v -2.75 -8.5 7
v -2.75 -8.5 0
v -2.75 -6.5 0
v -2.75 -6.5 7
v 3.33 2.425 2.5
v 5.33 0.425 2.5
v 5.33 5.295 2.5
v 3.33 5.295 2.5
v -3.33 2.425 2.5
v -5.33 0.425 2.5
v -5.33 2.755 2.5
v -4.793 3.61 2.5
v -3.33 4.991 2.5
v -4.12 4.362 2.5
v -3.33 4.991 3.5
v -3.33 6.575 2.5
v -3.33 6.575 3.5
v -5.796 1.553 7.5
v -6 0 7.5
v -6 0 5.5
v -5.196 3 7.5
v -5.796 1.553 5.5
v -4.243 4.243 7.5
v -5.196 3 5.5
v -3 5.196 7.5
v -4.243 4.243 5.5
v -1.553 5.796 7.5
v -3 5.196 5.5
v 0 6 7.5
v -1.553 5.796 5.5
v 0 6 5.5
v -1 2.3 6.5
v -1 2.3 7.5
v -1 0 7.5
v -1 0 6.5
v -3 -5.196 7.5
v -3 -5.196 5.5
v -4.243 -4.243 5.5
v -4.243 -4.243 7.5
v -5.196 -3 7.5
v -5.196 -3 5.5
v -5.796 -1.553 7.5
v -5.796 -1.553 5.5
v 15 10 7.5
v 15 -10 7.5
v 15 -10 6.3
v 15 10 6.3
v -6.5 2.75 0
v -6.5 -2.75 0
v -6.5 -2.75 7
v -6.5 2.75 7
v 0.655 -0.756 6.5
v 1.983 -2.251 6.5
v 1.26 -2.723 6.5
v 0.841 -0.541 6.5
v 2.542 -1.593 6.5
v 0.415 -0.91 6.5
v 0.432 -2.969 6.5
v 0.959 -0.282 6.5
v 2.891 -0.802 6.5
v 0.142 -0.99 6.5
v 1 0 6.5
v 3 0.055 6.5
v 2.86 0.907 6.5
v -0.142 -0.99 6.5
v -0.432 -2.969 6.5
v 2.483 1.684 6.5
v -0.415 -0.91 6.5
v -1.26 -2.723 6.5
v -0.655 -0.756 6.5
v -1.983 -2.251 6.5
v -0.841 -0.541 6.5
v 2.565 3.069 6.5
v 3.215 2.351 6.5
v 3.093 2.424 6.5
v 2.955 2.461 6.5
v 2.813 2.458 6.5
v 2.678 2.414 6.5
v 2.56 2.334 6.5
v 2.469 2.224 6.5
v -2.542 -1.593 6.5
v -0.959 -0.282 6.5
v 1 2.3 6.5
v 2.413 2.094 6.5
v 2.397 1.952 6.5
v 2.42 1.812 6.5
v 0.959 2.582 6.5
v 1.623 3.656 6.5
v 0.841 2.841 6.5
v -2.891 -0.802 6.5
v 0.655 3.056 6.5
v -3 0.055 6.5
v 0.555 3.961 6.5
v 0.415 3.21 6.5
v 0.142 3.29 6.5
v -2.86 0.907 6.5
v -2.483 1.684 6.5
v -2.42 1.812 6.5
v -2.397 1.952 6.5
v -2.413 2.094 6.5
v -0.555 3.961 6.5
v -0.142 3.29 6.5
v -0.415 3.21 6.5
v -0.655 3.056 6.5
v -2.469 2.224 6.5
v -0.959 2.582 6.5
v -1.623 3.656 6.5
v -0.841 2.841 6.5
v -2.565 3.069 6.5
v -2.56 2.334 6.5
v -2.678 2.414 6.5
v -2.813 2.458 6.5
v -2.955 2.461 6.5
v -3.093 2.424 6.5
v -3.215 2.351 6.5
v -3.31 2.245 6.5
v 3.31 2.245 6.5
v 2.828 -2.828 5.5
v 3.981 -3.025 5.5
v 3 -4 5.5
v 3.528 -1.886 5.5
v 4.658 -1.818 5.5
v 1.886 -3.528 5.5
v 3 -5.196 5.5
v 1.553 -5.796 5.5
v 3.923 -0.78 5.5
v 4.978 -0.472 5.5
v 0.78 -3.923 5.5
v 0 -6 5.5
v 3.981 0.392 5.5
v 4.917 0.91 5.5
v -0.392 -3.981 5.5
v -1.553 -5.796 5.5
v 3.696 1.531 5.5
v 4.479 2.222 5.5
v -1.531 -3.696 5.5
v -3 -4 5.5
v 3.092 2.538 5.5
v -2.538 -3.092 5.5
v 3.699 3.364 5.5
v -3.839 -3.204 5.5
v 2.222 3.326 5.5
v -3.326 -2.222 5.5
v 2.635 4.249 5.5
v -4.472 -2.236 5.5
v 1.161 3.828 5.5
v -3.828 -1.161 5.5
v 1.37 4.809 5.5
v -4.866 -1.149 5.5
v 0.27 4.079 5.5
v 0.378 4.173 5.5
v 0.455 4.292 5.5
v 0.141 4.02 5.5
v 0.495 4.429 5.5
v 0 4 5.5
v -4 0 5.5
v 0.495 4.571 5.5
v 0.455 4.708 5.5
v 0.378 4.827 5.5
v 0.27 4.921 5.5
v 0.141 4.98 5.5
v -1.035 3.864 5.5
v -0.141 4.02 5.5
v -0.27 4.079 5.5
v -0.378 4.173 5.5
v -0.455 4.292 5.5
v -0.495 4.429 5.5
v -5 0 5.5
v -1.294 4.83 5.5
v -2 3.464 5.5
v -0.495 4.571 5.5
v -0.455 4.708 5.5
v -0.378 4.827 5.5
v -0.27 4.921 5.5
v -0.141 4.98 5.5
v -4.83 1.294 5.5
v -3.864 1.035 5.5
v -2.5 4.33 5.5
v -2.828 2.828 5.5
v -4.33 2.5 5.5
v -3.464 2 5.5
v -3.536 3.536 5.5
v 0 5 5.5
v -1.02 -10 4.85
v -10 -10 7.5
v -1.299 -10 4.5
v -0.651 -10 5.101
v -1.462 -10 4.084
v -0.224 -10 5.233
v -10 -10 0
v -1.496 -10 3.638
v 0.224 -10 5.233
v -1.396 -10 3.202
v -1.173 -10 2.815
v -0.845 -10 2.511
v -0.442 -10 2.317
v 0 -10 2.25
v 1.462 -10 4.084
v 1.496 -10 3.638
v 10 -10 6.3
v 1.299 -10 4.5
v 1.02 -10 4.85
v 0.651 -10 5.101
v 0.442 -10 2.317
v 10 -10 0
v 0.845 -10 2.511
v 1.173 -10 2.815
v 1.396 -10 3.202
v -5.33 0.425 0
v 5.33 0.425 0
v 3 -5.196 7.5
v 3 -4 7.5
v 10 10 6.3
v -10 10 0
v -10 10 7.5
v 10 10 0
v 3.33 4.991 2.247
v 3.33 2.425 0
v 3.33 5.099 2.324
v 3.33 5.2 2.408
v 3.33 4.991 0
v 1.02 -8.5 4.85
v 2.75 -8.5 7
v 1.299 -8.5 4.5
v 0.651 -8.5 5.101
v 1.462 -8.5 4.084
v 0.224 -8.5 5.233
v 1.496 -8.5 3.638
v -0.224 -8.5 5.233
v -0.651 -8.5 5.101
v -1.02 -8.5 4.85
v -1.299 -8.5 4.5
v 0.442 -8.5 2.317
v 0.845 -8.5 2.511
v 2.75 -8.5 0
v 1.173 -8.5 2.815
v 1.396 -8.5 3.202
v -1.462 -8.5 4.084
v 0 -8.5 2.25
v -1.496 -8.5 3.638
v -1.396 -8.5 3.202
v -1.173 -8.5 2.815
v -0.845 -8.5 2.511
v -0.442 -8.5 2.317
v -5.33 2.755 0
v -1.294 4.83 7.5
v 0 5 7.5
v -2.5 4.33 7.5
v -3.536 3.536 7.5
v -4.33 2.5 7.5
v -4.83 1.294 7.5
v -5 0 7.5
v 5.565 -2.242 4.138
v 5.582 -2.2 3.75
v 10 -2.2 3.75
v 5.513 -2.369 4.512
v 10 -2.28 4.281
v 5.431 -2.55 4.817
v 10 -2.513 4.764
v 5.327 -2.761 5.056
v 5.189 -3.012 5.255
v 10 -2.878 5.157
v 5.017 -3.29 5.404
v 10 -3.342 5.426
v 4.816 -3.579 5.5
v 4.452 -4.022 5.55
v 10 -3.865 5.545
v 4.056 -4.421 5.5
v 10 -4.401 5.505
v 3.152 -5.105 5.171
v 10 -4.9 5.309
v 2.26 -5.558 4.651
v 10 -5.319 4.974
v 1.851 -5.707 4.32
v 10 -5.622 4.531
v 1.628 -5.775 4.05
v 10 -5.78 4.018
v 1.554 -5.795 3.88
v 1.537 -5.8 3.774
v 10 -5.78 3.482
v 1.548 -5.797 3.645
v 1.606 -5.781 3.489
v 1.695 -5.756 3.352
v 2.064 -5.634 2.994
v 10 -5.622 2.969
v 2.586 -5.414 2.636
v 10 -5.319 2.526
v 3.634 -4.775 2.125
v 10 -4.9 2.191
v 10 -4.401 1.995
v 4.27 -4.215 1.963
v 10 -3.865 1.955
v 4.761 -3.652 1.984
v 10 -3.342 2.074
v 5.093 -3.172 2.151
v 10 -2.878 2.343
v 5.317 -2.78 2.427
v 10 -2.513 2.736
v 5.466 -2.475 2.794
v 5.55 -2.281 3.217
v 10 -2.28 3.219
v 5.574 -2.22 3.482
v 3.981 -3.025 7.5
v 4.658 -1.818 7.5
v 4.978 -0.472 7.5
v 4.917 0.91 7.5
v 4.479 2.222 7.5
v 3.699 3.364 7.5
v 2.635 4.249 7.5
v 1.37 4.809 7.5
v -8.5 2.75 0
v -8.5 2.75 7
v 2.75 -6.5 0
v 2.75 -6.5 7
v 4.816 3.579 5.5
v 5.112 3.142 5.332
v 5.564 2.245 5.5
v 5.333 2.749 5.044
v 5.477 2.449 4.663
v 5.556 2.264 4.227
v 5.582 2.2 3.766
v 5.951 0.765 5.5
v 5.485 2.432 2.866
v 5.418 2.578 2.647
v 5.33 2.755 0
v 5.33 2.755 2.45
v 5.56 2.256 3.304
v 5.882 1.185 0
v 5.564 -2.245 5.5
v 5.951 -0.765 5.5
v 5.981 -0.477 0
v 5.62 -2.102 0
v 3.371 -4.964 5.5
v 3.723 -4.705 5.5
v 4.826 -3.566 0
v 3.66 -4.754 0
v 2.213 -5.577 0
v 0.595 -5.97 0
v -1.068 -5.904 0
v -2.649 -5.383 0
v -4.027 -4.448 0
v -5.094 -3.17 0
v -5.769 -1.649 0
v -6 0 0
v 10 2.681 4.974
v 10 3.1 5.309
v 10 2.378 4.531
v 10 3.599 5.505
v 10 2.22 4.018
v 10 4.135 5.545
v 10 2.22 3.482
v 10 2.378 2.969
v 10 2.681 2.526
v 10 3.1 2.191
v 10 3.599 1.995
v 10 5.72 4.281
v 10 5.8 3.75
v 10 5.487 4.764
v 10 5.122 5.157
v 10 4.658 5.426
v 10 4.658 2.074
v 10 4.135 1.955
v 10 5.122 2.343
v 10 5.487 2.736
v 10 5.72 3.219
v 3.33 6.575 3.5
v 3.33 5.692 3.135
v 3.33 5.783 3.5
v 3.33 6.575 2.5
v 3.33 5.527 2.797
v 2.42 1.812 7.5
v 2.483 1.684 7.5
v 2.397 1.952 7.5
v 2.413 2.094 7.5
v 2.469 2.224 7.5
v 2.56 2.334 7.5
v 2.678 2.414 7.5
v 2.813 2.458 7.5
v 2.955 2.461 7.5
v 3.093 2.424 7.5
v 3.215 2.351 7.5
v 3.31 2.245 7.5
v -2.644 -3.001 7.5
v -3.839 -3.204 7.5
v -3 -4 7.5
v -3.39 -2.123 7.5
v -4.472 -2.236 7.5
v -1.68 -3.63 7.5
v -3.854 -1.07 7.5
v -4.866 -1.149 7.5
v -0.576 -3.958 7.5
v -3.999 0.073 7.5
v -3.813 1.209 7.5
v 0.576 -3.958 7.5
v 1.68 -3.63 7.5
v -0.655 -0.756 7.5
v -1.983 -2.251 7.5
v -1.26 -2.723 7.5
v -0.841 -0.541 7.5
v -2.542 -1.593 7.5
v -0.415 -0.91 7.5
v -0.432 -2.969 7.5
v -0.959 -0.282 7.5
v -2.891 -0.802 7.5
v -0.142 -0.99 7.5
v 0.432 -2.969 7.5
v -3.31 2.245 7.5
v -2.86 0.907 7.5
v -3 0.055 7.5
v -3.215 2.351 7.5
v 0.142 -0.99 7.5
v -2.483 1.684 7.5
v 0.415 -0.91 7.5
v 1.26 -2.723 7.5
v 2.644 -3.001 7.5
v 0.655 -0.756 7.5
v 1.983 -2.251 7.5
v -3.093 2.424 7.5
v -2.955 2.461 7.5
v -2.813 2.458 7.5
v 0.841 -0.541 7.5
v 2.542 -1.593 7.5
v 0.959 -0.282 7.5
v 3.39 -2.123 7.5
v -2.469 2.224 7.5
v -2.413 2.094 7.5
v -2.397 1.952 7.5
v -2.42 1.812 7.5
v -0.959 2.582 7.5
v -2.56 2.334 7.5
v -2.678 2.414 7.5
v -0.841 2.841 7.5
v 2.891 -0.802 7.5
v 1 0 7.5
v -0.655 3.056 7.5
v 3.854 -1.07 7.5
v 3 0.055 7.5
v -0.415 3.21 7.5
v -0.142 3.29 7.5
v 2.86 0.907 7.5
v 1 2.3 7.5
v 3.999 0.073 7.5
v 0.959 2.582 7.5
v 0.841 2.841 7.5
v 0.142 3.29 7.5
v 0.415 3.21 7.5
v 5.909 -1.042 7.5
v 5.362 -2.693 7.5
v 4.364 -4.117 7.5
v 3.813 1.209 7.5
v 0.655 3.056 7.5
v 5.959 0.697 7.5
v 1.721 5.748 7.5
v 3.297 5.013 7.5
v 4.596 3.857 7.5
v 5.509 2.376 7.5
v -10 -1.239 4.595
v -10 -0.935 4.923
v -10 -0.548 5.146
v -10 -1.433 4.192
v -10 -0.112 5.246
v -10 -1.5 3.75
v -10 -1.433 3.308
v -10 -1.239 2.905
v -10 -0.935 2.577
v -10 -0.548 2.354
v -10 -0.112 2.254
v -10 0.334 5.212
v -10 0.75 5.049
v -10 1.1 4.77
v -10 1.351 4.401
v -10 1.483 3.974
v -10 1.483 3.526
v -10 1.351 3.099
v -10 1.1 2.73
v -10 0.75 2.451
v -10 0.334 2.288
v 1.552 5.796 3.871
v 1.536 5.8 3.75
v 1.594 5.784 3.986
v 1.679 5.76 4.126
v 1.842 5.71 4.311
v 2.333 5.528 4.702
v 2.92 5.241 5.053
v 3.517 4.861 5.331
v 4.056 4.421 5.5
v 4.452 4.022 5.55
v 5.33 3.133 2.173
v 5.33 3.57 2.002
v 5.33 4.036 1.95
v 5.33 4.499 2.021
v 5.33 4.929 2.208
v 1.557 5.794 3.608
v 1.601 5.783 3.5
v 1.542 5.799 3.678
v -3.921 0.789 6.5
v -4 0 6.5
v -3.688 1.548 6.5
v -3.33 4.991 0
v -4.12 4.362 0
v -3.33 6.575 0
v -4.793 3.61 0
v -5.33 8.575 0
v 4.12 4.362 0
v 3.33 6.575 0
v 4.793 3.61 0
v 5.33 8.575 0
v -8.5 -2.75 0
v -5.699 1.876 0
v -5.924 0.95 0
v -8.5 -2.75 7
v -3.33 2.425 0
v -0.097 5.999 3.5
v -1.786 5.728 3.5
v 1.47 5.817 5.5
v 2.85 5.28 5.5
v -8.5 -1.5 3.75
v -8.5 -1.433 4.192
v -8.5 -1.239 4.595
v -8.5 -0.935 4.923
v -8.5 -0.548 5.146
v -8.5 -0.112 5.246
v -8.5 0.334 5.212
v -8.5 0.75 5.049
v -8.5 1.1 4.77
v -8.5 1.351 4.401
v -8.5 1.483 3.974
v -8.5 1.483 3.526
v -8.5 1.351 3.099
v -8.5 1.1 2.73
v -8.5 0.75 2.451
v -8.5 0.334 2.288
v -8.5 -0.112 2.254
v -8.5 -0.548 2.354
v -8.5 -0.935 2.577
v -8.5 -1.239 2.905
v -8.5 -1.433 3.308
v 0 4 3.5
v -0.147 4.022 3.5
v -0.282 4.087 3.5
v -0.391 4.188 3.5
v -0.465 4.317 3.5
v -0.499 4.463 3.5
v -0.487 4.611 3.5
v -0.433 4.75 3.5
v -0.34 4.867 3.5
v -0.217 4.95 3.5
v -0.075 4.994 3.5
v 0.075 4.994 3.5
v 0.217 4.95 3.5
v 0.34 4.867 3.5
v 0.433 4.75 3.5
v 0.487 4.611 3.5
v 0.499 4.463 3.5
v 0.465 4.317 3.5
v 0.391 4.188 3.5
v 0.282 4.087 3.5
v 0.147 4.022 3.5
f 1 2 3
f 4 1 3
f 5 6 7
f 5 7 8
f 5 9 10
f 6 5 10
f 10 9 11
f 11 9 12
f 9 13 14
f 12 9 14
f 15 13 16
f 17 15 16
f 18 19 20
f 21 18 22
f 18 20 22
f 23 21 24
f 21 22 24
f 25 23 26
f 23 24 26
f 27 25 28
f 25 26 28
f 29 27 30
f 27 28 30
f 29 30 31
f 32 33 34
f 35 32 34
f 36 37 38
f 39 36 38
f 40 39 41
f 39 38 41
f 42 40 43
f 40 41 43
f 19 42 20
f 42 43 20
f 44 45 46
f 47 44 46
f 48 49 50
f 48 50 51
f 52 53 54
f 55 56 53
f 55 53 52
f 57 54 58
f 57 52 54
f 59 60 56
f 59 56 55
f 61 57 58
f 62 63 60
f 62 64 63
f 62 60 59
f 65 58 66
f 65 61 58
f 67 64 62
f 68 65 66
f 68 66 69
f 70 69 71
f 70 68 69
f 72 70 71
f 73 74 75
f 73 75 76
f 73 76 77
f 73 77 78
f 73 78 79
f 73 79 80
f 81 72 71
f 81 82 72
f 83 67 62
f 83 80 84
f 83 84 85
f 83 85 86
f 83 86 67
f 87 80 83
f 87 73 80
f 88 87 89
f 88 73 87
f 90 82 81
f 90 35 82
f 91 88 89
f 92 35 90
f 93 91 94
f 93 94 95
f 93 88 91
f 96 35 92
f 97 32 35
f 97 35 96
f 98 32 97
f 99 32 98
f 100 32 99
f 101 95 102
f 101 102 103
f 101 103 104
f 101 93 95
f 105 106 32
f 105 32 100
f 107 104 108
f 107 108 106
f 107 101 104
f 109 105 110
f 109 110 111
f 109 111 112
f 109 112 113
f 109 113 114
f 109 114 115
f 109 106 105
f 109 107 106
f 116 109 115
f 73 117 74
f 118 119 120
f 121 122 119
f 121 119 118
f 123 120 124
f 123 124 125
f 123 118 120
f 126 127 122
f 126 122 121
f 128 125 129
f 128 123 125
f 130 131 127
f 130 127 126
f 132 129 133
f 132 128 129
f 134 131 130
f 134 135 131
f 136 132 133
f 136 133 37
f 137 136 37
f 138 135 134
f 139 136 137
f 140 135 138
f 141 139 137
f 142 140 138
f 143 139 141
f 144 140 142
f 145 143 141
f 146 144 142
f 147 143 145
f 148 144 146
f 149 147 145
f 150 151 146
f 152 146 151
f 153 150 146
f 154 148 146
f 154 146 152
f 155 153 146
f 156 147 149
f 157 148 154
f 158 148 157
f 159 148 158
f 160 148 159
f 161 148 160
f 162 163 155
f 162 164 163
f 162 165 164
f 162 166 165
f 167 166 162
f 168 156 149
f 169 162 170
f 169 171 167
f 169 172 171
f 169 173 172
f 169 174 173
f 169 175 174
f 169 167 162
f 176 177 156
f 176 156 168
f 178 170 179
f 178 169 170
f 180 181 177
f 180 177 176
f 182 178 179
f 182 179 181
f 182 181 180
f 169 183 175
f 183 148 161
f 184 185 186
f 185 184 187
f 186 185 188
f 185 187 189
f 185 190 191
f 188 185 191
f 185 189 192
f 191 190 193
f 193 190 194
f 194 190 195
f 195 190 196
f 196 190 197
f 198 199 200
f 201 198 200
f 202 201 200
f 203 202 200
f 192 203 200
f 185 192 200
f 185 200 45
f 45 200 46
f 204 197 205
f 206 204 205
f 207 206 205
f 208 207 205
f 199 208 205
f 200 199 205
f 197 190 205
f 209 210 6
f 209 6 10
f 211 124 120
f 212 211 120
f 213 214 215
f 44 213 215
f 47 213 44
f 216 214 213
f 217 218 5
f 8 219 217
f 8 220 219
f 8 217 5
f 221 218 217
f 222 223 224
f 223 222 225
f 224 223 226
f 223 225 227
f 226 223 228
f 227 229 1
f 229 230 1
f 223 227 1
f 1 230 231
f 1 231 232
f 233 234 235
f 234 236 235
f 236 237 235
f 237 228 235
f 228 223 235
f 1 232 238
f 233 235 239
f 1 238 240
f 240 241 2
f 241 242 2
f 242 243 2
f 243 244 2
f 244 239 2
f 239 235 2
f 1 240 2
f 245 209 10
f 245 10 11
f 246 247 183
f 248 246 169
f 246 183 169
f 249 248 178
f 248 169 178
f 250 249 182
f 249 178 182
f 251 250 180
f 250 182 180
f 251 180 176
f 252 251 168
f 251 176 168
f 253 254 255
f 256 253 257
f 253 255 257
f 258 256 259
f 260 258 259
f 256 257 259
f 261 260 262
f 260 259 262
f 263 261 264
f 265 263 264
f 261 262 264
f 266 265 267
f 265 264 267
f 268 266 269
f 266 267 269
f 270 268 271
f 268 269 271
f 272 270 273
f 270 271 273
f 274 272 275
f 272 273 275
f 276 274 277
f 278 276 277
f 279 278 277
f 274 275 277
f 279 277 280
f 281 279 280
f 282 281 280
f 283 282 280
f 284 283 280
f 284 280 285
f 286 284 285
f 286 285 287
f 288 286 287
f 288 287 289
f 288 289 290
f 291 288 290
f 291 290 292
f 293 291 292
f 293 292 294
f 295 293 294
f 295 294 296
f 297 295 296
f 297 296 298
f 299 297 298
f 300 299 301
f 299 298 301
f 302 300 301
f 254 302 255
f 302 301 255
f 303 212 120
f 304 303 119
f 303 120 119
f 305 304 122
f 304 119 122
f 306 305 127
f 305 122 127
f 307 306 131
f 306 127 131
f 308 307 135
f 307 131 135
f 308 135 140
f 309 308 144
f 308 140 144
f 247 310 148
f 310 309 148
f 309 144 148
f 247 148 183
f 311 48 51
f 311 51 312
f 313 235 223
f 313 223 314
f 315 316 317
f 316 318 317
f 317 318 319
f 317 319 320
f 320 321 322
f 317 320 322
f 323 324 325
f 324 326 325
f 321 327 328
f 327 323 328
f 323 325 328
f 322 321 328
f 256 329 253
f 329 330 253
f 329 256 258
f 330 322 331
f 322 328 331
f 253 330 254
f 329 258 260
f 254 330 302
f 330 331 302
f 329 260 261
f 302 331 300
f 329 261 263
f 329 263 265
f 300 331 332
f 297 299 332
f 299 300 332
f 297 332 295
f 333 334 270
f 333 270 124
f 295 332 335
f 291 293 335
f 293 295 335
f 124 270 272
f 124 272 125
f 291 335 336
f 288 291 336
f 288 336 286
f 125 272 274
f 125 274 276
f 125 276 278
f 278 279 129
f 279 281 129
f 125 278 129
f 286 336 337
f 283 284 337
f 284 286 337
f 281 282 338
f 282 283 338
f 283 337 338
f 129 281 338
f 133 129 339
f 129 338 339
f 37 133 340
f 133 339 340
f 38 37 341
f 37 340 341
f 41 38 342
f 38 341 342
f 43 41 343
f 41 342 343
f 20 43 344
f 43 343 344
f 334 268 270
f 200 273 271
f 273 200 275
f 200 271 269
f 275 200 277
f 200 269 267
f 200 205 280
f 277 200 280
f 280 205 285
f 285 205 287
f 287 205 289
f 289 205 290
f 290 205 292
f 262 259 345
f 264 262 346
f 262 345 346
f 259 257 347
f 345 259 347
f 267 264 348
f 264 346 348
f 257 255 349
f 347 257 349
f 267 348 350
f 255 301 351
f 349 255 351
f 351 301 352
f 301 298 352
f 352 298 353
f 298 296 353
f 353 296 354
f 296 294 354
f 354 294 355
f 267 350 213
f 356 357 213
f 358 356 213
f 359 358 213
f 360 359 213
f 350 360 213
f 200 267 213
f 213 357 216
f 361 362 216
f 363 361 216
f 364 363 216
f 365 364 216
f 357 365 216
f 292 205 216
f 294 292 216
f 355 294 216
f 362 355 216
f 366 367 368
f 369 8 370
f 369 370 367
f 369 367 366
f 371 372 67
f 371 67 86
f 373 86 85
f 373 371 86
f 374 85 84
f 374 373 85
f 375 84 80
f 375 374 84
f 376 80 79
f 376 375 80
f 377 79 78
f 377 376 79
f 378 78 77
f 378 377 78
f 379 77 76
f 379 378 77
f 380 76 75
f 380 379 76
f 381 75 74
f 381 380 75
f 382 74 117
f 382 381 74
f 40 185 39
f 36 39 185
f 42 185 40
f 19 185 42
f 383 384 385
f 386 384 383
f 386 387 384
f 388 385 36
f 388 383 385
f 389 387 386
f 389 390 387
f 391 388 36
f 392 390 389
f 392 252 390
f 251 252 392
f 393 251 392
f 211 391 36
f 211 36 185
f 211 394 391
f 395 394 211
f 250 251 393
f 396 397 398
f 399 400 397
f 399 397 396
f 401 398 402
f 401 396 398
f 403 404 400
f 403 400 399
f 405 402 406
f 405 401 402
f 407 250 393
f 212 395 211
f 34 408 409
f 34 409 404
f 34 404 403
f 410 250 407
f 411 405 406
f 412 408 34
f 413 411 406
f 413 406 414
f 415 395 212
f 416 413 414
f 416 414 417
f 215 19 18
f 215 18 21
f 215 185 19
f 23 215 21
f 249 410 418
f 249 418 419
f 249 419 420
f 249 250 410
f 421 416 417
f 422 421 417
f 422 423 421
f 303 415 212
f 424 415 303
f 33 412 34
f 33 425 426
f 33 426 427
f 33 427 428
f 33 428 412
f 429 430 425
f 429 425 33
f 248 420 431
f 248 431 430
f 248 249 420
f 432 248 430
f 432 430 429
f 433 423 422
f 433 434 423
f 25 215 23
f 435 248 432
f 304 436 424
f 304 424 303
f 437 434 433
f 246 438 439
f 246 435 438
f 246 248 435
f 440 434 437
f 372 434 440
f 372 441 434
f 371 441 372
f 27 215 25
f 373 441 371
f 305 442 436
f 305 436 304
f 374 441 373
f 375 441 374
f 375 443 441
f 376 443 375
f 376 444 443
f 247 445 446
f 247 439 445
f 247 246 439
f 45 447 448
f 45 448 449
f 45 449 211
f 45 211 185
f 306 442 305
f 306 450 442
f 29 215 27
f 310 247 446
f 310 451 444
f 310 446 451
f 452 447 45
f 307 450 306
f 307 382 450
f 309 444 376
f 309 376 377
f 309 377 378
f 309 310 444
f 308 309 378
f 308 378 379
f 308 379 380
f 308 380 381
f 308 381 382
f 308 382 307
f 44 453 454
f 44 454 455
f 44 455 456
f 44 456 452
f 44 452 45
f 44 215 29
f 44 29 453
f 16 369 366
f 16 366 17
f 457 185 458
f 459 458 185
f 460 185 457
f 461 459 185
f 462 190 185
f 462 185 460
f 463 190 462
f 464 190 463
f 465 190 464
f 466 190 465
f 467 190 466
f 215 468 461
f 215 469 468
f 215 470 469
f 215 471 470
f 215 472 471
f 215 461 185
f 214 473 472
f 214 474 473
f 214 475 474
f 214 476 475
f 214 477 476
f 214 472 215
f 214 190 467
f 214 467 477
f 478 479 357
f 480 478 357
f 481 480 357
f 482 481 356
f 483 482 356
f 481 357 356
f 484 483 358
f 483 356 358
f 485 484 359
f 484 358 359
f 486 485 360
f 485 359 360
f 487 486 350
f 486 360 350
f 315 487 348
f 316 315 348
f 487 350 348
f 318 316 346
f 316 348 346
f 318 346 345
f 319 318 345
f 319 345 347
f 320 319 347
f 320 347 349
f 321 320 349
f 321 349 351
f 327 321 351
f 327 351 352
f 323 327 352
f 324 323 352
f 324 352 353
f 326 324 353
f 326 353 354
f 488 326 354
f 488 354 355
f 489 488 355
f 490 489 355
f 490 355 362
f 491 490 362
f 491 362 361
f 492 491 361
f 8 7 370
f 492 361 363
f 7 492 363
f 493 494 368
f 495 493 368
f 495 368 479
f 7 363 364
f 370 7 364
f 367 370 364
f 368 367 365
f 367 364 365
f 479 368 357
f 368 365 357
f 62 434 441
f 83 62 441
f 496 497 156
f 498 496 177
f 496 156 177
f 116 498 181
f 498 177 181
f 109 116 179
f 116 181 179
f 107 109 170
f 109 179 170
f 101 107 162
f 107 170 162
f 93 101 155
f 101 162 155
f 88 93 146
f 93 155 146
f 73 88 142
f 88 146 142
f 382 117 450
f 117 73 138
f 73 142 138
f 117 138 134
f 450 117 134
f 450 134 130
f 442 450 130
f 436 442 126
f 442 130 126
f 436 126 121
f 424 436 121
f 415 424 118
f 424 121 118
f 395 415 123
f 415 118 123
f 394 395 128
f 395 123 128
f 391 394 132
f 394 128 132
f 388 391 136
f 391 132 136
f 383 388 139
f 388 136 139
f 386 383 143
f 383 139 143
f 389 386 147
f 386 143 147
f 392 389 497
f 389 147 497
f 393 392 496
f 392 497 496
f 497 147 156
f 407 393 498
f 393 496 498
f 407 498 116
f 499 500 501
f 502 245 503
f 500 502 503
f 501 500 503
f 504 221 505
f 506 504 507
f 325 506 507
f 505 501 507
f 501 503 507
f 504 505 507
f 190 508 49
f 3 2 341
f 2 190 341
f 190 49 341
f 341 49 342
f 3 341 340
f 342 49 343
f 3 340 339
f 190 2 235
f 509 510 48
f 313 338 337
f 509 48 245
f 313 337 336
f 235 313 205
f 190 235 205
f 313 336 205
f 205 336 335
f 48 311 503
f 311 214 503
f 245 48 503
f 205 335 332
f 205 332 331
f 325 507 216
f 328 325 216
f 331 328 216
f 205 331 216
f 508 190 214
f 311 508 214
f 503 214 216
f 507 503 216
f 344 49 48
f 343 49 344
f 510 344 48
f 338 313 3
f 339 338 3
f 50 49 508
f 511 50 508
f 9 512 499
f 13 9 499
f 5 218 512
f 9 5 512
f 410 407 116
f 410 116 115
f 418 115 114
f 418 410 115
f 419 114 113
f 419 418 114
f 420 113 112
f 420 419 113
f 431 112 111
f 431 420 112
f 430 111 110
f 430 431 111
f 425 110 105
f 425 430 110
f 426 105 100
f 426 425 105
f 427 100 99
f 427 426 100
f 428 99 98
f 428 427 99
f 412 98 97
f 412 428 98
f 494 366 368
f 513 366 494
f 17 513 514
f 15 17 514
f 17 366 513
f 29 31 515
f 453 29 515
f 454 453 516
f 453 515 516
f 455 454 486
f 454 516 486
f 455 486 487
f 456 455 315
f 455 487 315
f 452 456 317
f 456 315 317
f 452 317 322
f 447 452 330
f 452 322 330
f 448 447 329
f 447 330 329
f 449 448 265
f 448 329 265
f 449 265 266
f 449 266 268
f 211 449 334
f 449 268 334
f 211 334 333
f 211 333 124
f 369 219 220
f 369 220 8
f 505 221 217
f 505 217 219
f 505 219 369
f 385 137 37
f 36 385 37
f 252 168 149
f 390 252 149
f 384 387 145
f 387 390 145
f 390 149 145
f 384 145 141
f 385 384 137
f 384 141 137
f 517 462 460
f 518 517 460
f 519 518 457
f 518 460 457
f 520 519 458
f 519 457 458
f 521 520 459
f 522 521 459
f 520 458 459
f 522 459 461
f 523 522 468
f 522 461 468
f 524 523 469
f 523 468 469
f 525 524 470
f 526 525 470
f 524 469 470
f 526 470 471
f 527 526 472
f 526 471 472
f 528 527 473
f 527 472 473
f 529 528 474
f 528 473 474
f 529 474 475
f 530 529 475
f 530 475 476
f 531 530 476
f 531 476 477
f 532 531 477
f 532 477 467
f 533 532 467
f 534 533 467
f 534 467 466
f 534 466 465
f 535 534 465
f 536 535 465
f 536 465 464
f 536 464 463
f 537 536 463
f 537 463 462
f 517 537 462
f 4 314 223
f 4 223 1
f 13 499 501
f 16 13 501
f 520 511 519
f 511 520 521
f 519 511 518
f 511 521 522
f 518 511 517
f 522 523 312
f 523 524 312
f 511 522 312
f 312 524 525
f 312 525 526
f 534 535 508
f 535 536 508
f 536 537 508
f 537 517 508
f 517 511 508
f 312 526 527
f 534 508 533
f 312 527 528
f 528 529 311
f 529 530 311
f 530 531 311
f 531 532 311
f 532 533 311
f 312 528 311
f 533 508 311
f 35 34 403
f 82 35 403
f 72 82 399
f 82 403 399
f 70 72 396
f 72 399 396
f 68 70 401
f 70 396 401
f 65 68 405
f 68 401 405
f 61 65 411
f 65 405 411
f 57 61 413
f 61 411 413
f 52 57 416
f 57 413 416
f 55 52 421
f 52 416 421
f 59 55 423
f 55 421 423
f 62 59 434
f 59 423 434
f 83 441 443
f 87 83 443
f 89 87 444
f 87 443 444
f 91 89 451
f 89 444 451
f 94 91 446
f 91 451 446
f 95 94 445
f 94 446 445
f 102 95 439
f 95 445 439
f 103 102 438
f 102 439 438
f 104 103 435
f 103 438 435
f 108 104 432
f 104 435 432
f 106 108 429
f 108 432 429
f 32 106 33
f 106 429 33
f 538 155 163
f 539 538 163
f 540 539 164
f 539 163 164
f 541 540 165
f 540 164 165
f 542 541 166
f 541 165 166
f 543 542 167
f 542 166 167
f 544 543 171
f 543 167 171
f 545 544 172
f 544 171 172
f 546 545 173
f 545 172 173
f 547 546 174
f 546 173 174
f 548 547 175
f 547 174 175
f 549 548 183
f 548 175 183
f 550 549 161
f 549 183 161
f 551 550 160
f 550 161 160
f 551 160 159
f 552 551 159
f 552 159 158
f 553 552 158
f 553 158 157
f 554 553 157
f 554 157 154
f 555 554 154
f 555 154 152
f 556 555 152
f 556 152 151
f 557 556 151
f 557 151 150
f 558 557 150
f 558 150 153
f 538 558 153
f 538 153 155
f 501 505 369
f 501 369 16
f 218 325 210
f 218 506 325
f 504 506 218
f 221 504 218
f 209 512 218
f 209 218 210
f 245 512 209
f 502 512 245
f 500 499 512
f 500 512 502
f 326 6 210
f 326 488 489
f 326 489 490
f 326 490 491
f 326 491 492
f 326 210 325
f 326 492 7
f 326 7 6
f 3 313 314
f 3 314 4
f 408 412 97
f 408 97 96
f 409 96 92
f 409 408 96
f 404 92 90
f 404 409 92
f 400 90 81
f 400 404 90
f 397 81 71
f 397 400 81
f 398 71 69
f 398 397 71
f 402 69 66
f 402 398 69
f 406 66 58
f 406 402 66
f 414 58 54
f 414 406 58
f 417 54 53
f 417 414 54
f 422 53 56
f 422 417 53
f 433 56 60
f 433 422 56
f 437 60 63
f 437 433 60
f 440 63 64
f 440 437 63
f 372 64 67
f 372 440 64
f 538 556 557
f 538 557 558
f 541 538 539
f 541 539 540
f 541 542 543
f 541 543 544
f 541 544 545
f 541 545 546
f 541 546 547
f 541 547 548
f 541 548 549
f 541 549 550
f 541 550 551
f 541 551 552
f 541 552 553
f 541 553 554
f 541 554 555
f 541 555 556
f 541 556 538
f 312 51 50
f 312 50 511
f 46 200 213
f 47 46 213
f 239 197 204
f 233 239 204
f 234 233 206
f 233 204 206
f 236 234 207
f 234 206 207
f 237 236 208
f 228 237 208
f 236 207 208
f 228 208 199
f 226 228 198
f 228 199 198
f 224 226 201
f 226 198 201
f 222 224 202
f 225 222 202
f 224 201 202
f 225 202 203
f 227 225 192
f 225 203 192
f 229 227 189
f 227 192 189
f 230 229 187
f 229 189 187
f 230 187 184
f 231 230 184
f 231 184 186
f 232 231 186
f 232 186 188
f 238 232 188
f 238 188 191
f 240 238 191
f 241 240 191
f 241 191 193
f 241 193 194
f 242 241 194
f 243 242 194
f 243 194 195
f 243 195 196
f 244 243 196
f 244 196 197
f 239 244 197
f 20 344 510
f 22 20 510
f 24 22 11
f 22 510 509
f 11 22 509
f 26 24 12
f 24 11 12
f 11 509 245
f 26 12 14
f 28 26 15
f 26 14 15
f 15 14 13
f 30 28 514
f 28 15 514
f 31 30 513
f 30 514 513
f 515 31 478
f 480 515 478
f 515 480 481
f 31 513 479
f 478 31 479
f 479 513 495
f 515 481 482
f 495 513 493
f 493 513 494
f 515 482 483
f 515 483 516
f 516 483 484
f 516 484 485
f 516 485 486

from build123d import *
from build123d.topology import SkipClean

# Parameters (mm, degrees)
SKETCH1_W               = 20
SKETCH1_H               = 20
BOSS_EXTRUDE1_DEPTH     = 7.5
SKETCH2_R               = 6
CUT_EXTRUDE1_DEPTH      = 5.5
CUT_EXTRUDE2_DEPTH      = 5
SKETCH4_R               = 4
CUT_EXTRUDE3_DEPTH      = 1
CUT_EXTRUDE4_REACH      = 18.008
SKETCH6_W               = 2
SKETCH6_H               = 5.5
SKETCH6_W_2             = 5.5
SKETCH6_H_2             = 2
CUT_EXTRUDE5_DEPTH      = 7
CUT_EXTRUDE6_REACH      = 25.585
SKETCH7_R               = 1.5
CUT_EXTRUDE7_REACH      = 25.585
SKETCH8_R               = 1.5
CUT_EXTRUDE8_REACH      = 25.585
CUT_EXTRUDE8_END_RADIUS = 6
SKETCH9_R               = 1.8
SKETCH10_W              = 1.2
SKETCH10_H              = 20
BOSS_EXTRUDE2_DEPTH     = 5
SKETCH11_R              = 0.5
BOSS_EXTRUDE3_DEPTH     = 2
CUT_EXTRUDE9_REACH      = 21.526
SKETCH12_W              = 6.66
SKETCH12_H              = 4.15
SKETCH13_W              = 10.66
SKETCH13_H              = 8.15
SKETCH13_W_2            = 6.66
SKETCH13_H_2            = 4.15
BOSS_EXTRUDE4_DEPTH     = 2.5


with BuildPart() as part:
    # Sketch1 → Boss-Extrude1 (new body)
    with BuildSketch(Plane.XY):
        Rectangle(SKETCH1_W, SKETCH1_H)
    extrude(amount=BOSS_EXTRUDE1_DEPTH)

    # Sketch2 → Cut-Extrude1 (cut)
    with BuildSketch(Plane(origin=(0, 0, 0), x_dir=(-1, 0, 0), z_dir=(0, 0, -1))):
        Circle(SKETCH2_R)
    extrude(amount=-CUT_EXTRUDE1_DEPTH, mode=Mode.SUBTRACT)

    # Sketch3 → Cut-Extrude2 (cut)
    with BuildSketch(Plane(origin=(0, 0, 5.5), x_dir=(-1, 0, 0), z_dir=(0, 0, -1))):
        with BuildLine():
            Line((-3, -5.196152423), (-3, -4))
            ThreePointArc((-3, -4), (-4.74341649, 1.58113883), (0, 5))
            Line((0, 5), (0, 6))
            ThreePointArc((0, 6), (-5.795554958, 1.552914271), (-3, -5.196152423))
        make_face()
        with BuildLine():
            Line((0, 6), (0, 5))
            ThreePointArc((0, 5), (3.535533906, 3.535533906), (5, 0))
            ThreePointArc((5, 0), (4.472135955, -2.236067977), (3, -4))
            Line((3, -4), (3, -5.196152423))
            ThreePointArc((3, -5.196152423), (5.196152423, -3), (6, 0))
            ThreePointArc((6, 0), (4.242640687, 4.242640687), (0, 6))
        make_face()
    extrude(amount=-CUT_EXTRUDE2_DEPTH, mode=Mode.SUBTRACT)

    # Sketch4 → Cut-Extrude3 (cut)
    with BuildSketch(Plane(origin=(0, 0, 5.5), x_dir=(-1, 0, 0), z_dir=(0, 0, -1))):
        Circle(SKETCH4_R)
    extrude(amount=-CUT_EXTRUDE3_DEPTH, mode=Mode.SUBTRACT)

    # Sketch5 → Cut-Extrude4 (cut, up to next)
    with BuildSketch(Plane.XY.offset(7.5), mode=Mode.PRIVATE) as cut_extrude4_sk1:
        with BuildLine():
            Line((-1, 2.3), (-1, 0))
            ThreePointArc((-1, 0), (0, -1), (1, 0))
            Line((1, 0), (1, 2.3))
            ThreePointArc((1, 2.3), (0, 3.3), (-1, 2.3))
        make_face()
    cut_extrude4_tool1 = extrude(cut_extrude4_sk1.sketch, amount=-CUT_EXTRUDE4_REACH, mode=Mode.PRIVATE) & part.part
    # Sketch5 → Cut-Extrude4 (cut, up to next)
    with BuildSketch(Plane.XY.offset(7.5), mode=Mode.PRIVATE) as cut_extrude4_sk2:
        with BuildLine():
            ThreePointArc((-2.482774923, 1.683991889), (0, -3), (2.482774923, 1.683991889))
            ThreePointArc((2.482774923, 1.683991889), (2.615905429, 2.378453024), (3.310366564, 2.245322518))
            ThreePointArc((3.310366564, 2.245322518), (0, -4), (-3.310366564, 2.245322518))
            ThreePointArc((-3.310366564, 2.245322518), (-2.615905429, 2.378453024), (-2.482774923, 1.683991889))
        make_face()
    cut_extrude4_tool2 = extrude(cut_extrude4_sk2.sketch, amount=-CUT_EXTRUDE4_REACH, mode=Mode.PRIVATE) & part.part
    add(cut_extrude4_tool1.solids().sort_by_distance((0, 1.15, 7.5))[0], mode=Mode.SUBTRACT)
    add(cut_extrude4_tool2.solids().sort_by_distance((2.673641, 2.293331, 7.5))[0], mode=Mode.SUBTRACT)

    # Sketch6 → Cut-Extrude5 (cut)
    with SkipClean():  # the faces are left unmerged after this step: merging them gives an invalid solid
        with BuildSketch(Plane(origin=(0, 0, 0), x_dir=(-1, 0, 0), z_dir=(0, 0, -1))):
            with Locations((7.5, 0)):
                Rectangle(SKETCH6_W, SKETCH6_H)
            with Locations((0, -7.5)):
                Rectangle(SKETCH6_W_2, SKETCH6_H_2)
        extrude(amount=-CUT_EXTRUDE5_DEPTH, mode=Mode.SUBTRACT)

    # Sketch7 → Cut-Extrude6 (cut, up to next)
    with BuildSketch(Plane.ZY.offset(10), mode=Mode.PRIVATE) as cut_extrude6_sk1:
        with Locations(Location((3.75, 0, 0), (0, 0, 270))):
            Circle(SKETCH7_R)
    cut_extrude6_tool1 = extrude(cut_extrude6_sk1.sketch, amount=-CUT_EXTRUDE6_REACH, mode=Mode.PRIVATE) & part.part
    add(cut_extrude6_tool1.solids().sort_by_distance((-10, 0, 3.75))[0], mode=Mode.SUBTRACT)

    # Sketch8 → Cut-Extrude7 (cut, up to next)
    with BuildSketch(Plane(origin=(0, -10, 0), x_dir=(-1, 0, 0), z_dir=(0, -1, 0)), mode=Mode.PRIVATE) as cut_extrude7_sk1:
        with Locations(Location((0, -3.75, 0), (0, 0, 90))):
            Circle(SKETCH8_R)
    cut_extrude7_tool1 = extrude(cut_extrude7_sk1.sketch, amount=-CUT_EXTRUDE7_REACH, mode=Mode.PRIVATE) & part.part
    add(cut_extrude7_tool1.solids().sort_by_distance((0, -10, 3.75))[0], mode=Mode.SUBTRACT)

    # Cut-Extrude8: up to this cylinder (the profile starts outside it)
    with SkipClean():  # the faces are left unmerged after this step: merging them gives an invalid solid
        cut_extrude8_end = Plane(origin=(0, 0, 3.75), z_dir=(0, 0, -1)) * Cylinder(CUT_EXTRUDE8_END_RADIUS, 64.17, mode=Mode.PRIVATE)
        # Sketch9 → Cut-Extrude8 (cut, up to the surface)
        with BuildSketch(Plane(origin=(10, 0, 0), x_dir=(0, 0, -1), z_dir=(1, 0, 0)), mode=Mode.PRIVATE) as cut_extrude8_sk1:
            with Locations(Location((-3.75, 4, 0), (0, 0, 90))):
                Circle(SKETCH9_R)
        cut_extrude8_tool1 = extrude(cut_extrude8_sk1.sketch, amount=-CUT_EXTRUDE8_REACH, mode=Mode.PRIVATE) - cut_extrude8_end
        add(cut_extrude8_tool1.solids().sort_by_distance((10, 4, 3.75))[0], mode=Mode.SUBTRACT)
        # Sketch9 → Cut-Extrude8 (cut, up to the surface)
        with BuildSketch(Plane(origin=(10, 0, 0), x_dir=(0, 0, -1), z_dir=(1, 0, 0)), mode=Mode.PRIVATE) as cut_extrude8_sk2:
            with Locations(Location((-3.75, -4, 0), (0, 0, 90))):
                Circle(SKETCH9_R)
        cut_extrude8_tool2 = extrude(cut_extrude8_sk2.sketch, amount=-CUT_EXTRUDE8_REACH, mode=Mode.PRIVATE) - cut_extrude8_end
        add(cut_extrude8_tool2.solids().sort_by_distance((10, -4, 3.75))[0], mode=Mode.SUBTRACT)

    # Sketch10 → Boss-Extrude2 (add)
    with SkipClean():  # the faces are left unmerged after this step: merging them gives an invalid solid
        with BuildSketch(Plane(origin=(10, 0, 0), x_dir=(0, 0, -1), z_dir=(1, 0, 0))):
            with Locations((-6.9, 0)):
                Rectangle(SKETCH10_W, SKETCH10_H)
        extrude(amount=BOSS_EXTRUDE2_DEPTH)

    # Sketch11 → Boss-Extrude3 (add)
    with SkipClean():  # the faces are left unmerged after this step: merging them gives an invalid solid
        with BuildSketch(Plane(origin=(0, 0, 5.5), x_dir=(-1, 0, 0), z_dir=(0, 0, -1))):
            with Locations(Location((0, 4.5, 0), (0, 0, 269.99891962))):
                Circle(SKETCH11_R)
        extrude(amount=BOSS_EXTRUDE3_DEPTH)

    # Cut-Extrude9: up to this face of the body (flat: up to its plane)
    cut_extrude9_end = Plane(part.part.faces().sort_by_distance((0, 4.5, 3.5))[0])
    # Sketch12 → Cut-Extrude9 (cut, up to the picked face)
    with BuildSketch(Plane(origin=(0, 0, 0), x_dir=(-1, 0, 0), z_dir=(0, 0, -1)), mode=Mode.PRIVATE) as cut_extrude9_sk1:
        with Locations((0, 4.5)):
            Rectangle(SKETCH12_W, SKETCH12_H)
    cut_extrude9_tool1 = split(extrude(cut_extrude9_sk1.sketch, amount=-CUT_EXTRUDE9_REACH, mode=Mode.PRIVATE), bisect_by=cut_extrude9_end, keep=Keep.BOTH, mode=Mode.PRIVATE)
    add(cut_extrude9_tool1.solids().sort_by(Axis((0, 4.5, 0), (0, 0, 1)))[0], mode=Mode.SUBTRACT)

    # Sketch13 → Boss-Extrude4 (add)
    with SkipClean():  # the faces are left unmerged after this step: merging them gives an invalid solid
        with BuildSketch(Plane(origin=(0, 0, 0), x_dir=(-1, 0, 0), z_dir=(0, 0, -1))):
            with Locations((0, 4.5)):
                Rectangle(SKETCH13_W, SKETCH13_H)
            with Locations((0, 4.5)):
                Rectangle(SKETCH13_W_2, SKETCH13_H_2, mode=Mode.SUBTRACT)
        extrude(amount=-BOSS_EXTRUDE4_DEPTH)


solid = part.part
